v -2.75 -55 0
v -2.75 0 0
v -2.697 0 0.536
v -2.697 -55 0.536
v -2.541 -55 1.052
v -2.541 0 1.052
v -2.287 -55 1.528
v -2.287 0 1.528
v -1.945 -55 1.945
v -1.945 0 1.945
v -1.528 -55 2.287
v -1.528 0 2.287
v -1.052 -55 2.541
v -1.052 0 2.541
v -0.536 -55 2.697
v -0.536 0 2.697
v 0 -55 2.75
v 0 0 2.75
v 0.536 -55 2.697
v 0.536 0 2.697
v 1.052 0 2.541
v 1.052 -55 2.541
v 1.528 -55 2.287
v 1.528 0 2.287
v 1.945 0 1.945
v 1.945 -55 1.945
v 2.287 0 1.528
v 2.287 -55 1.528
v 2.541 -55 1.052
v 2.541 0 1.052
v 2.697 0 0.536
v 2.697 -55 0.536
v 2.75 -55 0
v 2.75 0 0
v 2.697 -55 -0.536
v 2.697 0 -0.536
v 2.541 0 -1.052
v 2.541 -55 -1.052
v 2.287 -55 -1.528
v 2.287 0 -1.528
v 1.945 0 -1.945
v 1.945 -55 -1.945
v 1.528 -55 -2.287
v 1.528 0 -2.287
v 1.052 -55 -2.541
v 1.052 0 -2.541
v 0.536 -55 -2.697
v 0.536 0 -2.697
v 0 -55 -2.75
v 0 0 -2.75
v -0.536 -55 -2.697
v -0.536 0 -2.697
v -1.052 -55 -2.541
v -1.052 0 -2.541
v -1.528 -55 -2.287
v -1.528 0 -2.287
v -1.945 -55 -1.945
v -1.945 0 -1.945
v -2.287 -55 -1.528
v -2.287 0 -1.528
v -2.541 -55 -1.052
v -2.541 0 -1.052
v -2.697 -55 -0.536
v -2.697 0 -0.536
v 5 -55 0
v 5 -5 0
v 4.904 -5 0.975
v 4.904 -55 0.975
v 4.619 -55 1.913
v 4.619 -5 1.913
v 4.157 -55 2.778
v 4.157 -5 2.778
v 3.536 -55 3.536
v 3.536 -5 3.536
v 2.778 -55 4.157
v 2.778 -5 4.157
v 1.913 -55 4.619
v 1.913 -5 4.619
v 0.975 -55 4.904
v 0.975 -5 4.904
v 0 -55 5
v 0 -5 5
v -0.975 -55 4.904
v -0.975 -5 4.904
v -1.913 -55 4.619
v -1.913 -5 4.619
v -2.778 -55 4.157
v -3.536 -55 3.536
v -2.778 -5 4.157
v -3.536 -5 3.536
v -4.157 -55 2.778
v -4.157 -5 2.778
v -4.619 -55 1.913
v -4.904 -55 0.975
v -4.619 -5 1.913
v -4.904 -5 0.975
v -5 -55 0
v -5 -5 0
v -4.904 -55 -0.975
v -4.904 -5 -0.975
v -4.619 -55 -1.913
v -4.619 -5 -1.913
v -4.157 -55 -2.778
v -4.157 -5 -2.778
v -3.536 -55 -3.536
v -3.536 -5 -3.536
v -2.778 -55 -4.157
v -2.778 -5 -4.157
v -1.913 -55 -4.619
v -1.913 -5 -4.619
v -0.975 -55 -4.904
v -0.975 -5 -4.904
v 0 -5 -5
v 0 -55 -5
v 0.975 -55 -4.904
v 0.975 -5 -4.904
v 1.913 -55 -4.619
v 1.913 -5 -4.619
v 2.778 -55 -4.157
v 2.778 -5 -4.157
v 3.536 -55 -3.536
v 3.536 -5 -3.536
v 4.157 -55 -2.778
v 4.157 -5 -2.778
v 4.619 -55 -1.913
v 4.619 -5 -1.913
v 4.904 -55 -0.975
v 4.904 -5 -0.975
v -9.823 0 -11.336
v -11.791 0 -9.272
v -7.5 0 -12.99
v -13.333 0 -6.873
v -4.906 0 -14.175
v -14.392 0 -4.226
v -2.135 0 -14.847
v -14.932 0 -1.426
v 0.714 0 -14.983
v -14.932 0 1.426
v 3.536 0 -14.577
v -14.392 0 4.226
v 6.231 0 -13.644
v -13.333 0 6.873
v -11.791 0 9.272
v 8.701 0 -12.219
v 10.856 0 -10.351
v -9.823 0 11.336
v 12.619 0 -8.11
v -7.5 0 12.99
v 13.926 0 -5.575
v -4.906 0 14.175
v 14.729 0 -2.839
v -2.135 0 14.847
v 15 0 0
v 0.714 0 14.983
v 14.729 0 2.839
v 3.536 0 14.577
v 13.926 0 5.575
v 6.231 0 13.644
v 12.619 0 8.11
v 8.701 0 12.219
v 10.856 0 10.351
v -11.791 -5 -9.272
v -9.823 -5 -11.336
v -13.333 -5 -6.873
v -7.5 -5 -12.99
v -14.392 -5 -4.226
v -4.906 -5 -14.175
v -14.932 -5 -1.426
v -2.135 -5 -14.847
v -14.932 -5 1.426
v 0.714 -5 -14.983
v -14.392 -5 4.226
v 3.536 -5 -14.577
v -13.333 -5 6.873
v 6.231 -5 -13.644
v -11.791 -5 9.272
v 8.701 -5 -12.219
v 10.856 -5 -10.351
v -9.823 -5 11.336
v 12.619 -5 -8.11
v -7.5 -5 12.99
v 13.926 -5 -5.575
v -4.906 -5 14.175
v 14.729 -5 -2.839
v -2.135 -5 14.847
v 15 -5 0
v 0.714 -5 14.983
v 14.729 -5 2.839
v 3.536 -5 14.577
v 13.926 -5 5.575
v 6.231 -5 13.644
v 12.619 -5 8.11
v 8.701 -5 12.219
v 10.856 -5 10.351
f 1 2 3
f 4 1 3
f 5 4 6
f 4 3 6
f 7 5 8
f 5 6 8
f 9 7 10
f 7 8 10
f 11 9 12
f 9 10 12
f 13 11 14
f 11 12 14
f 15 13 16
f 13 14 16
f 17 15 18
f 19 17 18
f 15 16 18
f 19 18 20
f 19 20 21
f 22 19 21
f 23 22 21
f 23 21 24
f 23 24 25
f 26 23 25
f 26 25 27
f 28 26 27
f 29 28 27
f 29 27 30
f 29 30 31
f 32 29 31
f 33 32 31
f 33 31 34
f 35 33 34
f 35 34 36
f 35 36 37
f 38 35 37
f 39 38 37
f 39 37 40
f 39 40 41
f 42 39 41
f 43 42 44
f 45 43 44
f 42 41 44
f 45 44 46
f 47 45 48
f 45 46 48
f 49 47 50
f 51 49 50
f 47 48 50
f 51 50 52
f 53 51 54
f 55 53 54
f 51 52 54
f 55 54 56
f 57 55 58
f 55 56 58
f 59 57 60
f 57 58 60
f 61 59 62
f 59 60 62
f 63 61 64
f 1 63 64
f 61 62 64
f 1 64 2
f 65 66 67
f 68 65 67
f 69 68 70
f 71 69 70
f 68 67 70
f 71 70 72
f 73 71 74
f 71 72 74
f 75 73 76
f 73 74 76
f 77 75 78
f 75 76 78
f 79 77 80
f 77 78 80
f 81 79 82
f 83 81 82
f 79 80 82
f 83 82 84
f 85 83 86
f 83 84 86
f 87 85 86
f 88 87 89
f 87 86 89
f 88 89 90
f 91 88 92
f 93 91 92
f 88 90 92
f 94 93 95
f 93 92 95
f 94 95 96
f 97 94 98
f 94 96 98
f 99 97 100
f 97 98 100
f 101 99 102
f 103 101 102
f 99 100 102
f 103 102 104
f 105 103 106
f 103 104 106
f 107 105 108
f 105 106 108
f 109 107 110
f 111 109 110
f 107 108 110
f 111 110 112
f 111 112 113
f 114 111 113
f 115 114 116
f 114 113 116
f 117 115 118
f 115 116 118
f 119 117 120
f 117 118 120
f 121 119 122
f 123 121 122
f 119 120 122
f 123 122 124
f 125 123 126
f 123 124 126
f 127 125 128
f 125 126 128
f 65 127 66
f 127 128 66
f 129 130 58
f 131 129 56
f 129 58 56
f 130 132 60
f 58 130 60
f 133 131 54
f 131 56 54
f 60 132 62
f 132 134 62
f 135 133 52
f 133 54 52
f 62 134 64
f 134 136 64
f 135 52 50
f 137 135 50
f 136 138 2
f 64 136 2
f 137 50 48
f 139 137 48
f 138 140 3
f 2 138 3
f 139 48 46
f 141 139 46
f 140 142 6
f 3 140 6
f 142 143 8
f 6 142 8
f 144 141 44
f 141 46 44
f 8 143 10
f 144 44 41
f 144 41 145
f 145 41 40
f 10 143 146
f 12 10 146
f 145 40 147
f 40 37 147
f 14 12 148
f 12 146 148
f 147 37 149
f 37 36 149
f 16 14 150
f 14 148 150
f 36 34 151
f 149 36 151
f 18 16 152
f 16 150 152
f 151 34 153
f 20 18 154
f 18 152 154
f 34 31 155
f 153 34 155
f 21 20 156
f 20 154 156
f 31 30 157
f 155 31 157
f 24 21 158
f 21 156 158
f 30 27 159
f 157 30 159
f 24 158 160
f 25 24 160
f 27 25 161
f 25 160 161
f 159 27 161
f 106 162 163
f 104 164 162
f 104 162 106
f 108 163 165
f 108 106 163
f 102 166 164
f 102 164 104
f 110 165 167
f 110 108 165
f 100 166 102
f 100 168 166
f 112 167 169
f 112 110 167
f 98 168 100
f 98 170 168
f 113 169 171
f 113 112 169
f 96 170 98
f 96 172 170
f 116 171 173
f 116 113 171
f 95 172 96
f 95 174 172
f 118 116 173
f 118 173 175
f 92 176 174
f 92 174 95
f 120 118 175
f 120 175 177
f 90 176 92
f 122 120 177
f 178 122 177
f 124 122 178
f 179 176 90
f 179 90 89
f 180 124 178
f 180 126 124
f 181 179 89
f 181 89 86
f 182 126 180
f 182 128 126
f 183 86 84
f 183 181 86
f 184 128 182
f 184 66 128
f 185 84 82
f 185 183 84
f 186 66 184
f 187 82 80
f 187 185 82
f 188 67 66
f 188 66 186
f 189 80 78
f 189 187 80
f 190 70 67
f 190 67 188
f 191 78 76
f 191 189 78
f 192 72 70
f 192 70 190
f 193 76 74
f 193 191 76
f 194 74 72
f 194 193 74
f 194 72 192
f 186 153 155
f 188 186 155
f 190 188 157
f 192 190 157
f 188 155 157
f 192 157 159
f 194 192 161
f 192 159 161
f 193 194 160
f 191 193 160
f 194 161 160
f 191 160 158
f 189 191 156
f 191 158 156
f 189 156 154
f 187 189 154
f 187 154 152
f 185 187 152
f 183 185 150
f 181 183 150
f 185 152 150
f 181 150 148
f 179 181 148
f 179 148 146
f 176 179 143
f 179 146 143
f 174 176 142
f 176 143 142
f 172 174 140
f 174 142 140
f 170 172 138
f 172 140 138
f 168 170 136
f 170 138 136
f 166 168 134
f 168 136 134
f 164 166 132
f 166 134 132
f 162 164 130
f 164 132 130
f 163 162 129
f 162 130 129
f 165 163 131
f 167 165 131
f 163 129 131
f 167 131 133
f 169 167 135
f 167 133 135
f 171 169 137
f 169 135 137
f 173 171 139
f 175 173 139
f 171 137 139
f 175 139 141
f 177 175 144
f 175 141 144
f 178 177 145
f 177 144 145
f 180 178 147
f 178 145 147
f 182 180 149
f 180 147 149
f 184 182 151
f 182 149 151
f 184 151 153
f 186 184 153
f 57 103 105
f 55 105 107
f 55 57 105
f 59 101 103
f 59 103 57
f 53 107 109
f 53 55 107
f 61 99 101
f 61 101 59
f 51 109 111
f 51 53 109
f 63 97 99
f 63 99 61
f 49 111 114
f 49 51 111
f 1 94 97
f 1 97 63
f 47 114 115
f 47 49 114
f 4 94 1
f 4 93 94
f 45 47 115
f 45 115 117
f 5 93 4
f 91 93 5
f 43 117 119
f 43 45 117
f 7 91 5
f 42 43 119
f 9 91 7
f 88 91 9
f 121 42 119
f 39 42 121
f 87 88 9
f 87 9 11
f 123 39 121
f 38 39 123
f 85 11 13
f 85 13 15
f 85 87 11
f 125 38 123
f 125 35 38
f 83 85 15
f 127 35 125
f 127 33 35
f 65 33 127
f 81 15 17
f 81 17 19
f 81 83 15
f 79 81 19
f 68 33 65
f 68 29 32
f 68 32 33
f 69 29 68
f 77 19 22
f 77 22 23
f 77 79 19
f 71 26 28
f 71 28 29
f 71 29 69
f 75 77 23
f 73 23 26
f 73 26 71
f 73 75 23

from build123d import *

# Parameters (mm, degrees)
F0_R     = 15
F1_DEPTH = 5
F2_R     = 5
F3_DEPTH = 50
F5_D     = 5.5


with BuildPart() as f1:
    # F0 (on Front) → F1 (new body)
    with BuildSketch(Plane.XZ):
        Circle(F0_R)
    extrude(amount=F1_DEPTH)

    # F2 (on face) → F3 (join)
    with BuildSketch(Plane.XZ.offset(5)):
        Circle(F2_R)
    extrude(amount=F3_DEPTH)

    # F5 (through all)
    with Locations(Plane.XZ.offset(55)):
        with Locations((0, 0)):
            Hole(F5_D / 2)


solid = f1.part
